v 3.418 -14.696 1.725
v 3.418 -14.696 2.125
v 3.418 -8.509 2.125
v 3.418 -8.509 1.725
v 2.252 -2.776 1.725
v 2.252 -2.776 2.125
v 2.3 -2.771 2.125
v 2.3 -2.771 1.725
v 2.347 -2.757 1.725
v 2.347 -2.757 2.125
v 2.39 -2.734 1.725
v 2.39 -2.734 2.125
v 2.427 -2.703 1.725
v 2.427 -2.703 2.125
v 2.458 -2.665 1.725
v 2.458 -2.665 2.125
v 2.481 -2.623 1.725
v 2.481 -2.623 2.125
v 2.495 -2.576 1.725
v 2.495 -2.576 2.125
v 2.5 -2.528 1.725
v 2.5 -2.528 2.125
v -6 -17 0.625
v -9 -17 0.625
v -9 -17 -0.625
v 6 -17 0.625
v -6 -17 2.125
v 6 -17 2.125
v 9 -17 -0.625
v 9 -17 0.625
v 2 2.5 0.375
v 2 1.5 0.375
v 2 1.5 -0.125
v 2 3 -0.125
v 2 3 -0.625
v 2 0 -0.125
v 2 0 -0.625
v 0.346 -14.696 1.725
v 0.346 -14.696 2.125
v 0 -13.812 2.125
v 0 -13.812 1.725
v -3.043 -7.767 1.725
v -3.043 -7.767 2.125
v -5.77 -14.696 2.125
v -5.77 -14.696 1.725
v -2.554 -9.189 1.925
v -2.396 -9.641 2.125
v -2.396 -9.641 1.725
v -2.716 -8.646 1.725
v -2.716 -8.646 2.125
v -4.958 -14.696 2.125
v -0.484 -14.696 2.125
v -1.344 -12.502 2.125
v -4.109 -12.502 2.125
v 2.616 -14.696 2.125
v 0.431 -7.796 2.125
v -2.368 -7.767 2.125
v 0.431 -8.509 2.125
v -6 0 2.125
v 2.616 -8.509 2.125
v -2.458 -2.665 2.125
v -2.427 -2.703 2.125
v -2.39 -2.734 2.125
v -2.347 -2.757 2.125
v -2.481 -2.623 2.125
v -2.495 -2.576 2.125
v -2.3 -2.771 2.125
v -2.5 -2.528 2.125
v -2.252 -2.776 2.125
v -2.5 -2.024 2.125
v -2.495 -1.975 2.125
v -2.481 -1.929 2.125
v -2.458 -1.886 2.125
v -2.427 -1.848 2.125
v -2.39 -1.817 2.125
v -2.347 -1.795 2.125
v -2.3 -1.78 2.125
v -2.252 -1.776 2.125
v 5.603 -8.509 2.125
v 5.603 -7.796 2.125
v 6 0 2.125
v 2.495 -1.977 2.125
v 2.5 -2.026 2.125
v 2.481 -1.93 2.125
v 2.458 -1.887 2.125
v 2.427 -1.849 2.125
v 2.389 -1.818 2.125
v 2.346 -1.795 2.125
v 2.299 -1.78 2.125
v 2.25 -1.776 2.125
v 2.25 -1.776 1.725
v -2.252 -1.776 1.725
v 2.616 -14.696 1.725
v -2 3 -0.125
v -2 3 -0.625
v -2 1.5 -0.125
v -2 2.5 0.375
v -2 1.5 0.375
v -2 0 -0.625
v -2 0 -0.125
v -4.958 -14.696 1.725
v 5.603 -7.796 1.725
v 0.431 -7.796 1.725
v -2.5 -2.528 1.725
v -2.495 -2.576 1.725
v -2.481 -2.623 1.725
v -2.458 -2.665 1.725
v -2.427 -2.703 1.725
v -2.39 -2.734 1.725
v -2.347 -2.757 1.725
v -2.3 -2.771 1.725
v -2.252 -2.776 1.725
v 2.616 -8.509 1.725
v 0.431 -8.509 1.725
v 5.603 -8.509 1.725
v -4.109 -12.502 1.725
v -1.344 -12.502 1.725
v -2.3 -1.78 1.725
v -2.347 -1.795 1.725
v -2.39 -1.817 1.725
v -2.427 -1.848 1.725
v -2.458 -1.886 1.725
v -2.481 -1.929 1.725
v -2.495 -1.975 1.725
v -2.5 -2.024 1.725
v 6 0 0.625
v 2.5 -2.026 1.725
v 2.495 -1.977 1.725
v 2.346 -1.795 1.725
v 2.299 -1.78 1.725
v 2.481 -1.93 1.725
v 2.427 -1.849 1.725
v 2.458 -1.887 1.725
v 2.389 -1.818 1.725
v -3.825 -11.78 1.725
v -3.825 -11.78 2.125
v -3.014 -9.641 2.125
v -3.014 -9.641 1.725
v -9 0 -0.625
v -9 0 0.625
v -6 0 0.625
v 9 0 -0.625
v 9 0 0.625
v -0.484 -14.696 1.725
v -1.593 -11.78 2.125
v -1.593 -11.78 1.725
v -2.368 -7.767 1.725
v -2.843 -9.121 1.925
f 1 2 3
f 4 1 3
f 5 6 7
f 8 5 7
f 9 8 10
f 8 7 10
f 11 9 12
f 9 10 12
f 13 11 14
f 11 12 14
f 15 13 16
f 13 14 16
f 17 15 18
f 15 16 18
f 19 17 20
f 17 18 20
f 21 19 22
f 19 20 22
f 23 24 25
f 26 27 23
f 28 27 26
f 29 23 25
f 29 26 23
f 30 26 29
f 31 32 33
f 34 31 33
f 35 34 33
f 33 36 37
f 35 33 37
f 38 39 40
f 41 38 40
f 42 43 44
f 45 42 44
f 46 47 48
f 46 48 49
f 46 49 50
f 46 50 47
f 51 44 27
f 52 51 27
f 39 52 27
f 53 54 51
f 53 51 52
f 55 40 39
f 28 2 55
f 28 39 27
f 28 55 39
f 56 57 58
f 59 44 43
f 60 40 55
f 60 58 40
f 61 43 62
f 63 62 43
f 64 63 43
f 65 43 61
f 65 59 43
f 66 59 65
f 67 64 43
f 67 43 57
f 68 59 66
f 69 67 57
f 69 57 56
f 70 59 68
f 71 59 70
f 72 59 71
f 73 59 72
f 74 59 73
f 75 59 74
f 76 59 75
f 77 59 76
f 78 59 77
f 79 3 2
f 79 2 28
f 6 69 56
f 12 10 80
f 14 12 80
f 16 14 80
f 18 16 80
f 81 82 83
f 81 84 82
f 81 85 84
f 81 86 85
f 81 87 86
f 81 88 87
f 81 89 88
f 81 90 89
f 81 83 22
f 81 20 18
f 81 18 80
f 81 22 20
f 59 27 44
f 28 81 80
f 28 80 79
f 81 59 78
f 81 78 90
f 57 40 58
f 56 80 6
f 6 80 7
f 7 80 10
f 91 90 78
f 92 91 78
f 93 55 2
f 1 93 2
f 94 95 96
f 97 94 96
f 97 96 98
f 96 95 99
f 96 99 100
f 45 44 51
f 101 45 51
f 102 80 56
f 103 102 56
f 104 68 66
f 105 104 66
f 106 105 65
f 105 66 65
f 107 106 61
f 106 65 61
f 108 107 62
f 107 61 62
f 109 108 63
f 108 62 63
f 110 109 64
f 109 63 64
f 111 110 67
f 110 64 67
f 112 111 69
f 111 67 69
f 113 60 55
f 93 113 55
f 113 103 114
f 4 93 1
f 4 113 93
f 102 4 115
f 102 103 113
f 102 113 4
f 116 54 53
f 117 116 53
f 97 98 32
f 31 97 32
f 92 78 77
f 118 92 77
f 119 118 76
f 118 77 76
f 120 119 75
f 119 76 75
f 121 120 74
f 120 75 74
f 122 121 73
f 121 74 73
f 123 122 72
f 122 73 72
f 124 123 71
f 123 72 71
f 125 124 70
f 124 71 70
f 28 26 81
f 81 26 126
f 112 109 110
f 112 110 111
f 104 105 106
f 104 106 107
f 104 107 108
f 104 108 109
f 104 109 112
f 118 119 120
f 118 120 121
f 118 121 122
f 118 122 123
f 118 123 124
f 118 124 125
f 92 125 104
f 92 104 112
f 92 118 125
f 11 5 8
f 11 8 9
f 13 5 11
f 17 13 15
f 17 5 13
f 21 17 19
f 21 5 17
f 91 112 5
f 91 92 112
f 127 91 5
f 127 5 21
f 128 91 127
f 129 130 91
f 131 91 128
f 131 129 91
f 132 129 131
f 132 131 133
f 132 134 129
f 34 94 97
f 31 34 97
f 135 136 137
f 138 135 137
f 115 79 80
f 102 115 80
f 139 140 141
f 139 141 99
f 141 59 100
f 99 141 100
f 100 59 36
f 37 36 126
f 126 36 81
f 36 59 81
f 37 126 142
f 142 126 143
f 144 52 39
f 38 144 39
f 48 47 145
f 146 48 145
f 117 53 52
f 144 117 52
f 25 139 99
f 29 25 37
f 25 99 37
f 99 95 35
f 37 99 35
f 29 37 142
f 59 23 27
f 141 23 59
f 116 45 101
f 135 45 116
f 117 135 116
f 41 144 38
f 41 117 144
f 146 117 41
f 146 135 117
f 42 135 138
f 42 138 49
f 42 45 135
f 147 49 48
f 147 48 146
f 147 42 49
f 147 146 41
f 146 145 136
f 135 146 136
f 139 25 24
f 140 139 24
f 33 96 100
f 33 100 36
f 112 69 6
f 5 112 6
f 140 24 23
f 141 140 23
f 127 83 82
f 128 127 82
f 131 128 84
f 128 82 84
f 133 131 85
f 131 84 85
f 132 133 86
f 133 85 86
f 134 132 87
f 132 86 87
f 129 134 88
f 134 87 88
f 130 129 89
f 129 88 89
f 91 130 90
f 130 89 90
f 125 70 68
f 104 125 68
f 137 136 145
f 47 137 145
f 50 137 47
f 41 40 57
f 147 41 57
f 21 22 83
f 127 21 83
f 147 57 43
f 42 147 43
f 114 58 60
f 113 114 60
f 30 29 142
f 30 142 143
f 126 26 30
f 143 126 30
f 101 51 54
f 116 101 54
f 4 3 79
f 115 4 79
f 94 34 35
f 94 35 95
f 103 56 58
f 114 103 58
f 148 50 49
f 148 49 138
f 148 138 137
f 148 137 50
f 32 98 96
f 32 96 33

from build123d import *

# Parameters (mm, degrees)
F0_W      = 18
F0_H      = 1.25
F1_DEPTH  = 17
F2_W      = 12
F2_H      = 17
F3_DEPTH  = 1.5
F5_DEPTH  = 3
F6_W      = 4
F6_H      = 1.5
F7_DEPTH  = 0.5
F9_DEPTH  = 25
F11_DEPTH = 0.4


with BuildPart() as f1:
    # F0 (on Front) → F1 (new body)
    with BuildSketch(Plane.XZ):
        Rectangle(F0_W, F0_H)
    extrude(amount=F1_DEPTH)

    # F2 (on face) → F3 (join)
    with BuildSketch(Plane.XY.offset(0.625)):
        with Locations((0, -8.5)):
            Rectangle(F2_W, F2_H)
    extrude(amount=F3_DEPTH)

    # F4 (on face) → F5 (join)
    with BuildSketch(Plane(origin=(0, 0, 0), x_dir=(-1, 0, 0), z_dir=(0, 1, 0))):
        Polygon((-2, 0.375), (-2, -0.625), (0, -0.625), (2, -0.625), (2, 0.375), align=None)
    extrude(amount=F5_DEPTH)

    # F6 (on face) → F7 (cut)
    with BuildSketch(Plane.XY.offset(0.375)):
        with Locations((0, 0.75)):
            Rectangle(F6_W, F6_H)
    extrude(amount=-F7_DEPTH, mode=Mode.SUBTRACT)

    # F8 (on face) → F9 (cut)
    with BuildSketch(Plane(origin=(-2, 0, 0), x_dir=(0, -1, 0), z_dir=(-1, 0, 0))):
        Polygon((-3, 0.375), (-3, -0.125), (-2.5, 0.375), align=None)
    extrude(amount=-F9_DEPTH, mode=Mode.SUBTRACT)

    # F10 (on face) → F11 (cut)
    with BuildSketch(Plane.XY.offset(2.125)):
        with BuildLine():
            Line((0, -2.7756802738), (0, -1.7756802738))
            Line((0, -1.7756802738), (-2.2519526784, -1.7756802738))
            ThreePointArc((-2.2519526784, -1.7756802738), (-2.4273486216, -1.8483316522), (-2.5, -2.0237275953))
            Line((-2.5, -2.0237275953), (-2.5, -2.5276329522))
            ThreePointArc((-2.5, -2.5276329522), (-2.4273486216, -2.7030288953), (-2.2519526784, -2.7756802738))
            Line((-2.2519526784, -2.7756802738), (0, -2.7756802738))
        make_face()
        with BuildLine():
            Line((2.25, -1.7756802738), (0, -1.7756802738))
            Line((0, -1.7756802738), (0, -2.7756802738))
            Line((0, -2.7756802738), (2.2519526784, -2.7756802738))
            ThreePointArc((2.2519526784, -2.7756802738), (2.4273486216, -2.7030288953), (2.5, -2.5276329522))
            Line((2.5, -2.5276329522), (2.5, -2.0256802738))
            ThreePointArc((2.5, -2.0256802738), (2.4267766953, -1.8489035785), (2.25, -1.7756802738))
        make_face()
        Polygon((0, -14.6959666163), (0, -13.8118481482), (-2.3675321166, -7.7671974242), (-3.0425887489, -7.7671974242), (-5.7699987665, -14.6959666163), (-4.9575144977, -14.6959666163), (-4.1087855775, -12.501655013), (-1.3436207146, -12.501655013), (-0.4843204378, -14.6959666163), align=None)
        with BuildLine():
            Line((-2.396225799, -9.6413479402), (-1.592802693, -11.7797823726))
            Line((-1.592802693, -11.7797823726), (-3.8248691415, -11.7797823726))
            Line((-3.8248691415, -11.7797823726), (-3.0138950665, -9.6413479402))
            add(Edge.make_bspline(
                [(-2.7163868863, -8.6461302206), (-2.8205902591, -9.0991883631), (-3.0138950665, -9.6413479402)],
                knots=[0, 0, 0, 1, 1, 1], degree=2))
            add(Edge.make_bspline(
                [(-2.396225799, -9.6413479402), (-2.5517757612, -9.2351058058), (-2.7163868863, -8.6461302206)],
                knots=[0, 0, 0, 1, 1, 1], degree=2))
        make_face(mode=Mode.SUBTRACT)
        Polygon((2.6161074505, -14.6959666163), (3.4180203626, -14.6959666163), (3.4180203626, -8.5087025841), (5.6032708031, -8.5087025841), (5.6032708031, -7.7958911066), (0.43085701, -7.7958911066), (0.43085701, -8.5087025841), (2.6161074505, -8.5087025841), align=None)
        Polygon((0.3462861567, -14.6959666163), (0, -13.8118481482), (0, -14.6959666163), align=None)
    extrude(amount=-F11_DEPTH, mode=Mode.SUBTRACT)


solid = f1.part
